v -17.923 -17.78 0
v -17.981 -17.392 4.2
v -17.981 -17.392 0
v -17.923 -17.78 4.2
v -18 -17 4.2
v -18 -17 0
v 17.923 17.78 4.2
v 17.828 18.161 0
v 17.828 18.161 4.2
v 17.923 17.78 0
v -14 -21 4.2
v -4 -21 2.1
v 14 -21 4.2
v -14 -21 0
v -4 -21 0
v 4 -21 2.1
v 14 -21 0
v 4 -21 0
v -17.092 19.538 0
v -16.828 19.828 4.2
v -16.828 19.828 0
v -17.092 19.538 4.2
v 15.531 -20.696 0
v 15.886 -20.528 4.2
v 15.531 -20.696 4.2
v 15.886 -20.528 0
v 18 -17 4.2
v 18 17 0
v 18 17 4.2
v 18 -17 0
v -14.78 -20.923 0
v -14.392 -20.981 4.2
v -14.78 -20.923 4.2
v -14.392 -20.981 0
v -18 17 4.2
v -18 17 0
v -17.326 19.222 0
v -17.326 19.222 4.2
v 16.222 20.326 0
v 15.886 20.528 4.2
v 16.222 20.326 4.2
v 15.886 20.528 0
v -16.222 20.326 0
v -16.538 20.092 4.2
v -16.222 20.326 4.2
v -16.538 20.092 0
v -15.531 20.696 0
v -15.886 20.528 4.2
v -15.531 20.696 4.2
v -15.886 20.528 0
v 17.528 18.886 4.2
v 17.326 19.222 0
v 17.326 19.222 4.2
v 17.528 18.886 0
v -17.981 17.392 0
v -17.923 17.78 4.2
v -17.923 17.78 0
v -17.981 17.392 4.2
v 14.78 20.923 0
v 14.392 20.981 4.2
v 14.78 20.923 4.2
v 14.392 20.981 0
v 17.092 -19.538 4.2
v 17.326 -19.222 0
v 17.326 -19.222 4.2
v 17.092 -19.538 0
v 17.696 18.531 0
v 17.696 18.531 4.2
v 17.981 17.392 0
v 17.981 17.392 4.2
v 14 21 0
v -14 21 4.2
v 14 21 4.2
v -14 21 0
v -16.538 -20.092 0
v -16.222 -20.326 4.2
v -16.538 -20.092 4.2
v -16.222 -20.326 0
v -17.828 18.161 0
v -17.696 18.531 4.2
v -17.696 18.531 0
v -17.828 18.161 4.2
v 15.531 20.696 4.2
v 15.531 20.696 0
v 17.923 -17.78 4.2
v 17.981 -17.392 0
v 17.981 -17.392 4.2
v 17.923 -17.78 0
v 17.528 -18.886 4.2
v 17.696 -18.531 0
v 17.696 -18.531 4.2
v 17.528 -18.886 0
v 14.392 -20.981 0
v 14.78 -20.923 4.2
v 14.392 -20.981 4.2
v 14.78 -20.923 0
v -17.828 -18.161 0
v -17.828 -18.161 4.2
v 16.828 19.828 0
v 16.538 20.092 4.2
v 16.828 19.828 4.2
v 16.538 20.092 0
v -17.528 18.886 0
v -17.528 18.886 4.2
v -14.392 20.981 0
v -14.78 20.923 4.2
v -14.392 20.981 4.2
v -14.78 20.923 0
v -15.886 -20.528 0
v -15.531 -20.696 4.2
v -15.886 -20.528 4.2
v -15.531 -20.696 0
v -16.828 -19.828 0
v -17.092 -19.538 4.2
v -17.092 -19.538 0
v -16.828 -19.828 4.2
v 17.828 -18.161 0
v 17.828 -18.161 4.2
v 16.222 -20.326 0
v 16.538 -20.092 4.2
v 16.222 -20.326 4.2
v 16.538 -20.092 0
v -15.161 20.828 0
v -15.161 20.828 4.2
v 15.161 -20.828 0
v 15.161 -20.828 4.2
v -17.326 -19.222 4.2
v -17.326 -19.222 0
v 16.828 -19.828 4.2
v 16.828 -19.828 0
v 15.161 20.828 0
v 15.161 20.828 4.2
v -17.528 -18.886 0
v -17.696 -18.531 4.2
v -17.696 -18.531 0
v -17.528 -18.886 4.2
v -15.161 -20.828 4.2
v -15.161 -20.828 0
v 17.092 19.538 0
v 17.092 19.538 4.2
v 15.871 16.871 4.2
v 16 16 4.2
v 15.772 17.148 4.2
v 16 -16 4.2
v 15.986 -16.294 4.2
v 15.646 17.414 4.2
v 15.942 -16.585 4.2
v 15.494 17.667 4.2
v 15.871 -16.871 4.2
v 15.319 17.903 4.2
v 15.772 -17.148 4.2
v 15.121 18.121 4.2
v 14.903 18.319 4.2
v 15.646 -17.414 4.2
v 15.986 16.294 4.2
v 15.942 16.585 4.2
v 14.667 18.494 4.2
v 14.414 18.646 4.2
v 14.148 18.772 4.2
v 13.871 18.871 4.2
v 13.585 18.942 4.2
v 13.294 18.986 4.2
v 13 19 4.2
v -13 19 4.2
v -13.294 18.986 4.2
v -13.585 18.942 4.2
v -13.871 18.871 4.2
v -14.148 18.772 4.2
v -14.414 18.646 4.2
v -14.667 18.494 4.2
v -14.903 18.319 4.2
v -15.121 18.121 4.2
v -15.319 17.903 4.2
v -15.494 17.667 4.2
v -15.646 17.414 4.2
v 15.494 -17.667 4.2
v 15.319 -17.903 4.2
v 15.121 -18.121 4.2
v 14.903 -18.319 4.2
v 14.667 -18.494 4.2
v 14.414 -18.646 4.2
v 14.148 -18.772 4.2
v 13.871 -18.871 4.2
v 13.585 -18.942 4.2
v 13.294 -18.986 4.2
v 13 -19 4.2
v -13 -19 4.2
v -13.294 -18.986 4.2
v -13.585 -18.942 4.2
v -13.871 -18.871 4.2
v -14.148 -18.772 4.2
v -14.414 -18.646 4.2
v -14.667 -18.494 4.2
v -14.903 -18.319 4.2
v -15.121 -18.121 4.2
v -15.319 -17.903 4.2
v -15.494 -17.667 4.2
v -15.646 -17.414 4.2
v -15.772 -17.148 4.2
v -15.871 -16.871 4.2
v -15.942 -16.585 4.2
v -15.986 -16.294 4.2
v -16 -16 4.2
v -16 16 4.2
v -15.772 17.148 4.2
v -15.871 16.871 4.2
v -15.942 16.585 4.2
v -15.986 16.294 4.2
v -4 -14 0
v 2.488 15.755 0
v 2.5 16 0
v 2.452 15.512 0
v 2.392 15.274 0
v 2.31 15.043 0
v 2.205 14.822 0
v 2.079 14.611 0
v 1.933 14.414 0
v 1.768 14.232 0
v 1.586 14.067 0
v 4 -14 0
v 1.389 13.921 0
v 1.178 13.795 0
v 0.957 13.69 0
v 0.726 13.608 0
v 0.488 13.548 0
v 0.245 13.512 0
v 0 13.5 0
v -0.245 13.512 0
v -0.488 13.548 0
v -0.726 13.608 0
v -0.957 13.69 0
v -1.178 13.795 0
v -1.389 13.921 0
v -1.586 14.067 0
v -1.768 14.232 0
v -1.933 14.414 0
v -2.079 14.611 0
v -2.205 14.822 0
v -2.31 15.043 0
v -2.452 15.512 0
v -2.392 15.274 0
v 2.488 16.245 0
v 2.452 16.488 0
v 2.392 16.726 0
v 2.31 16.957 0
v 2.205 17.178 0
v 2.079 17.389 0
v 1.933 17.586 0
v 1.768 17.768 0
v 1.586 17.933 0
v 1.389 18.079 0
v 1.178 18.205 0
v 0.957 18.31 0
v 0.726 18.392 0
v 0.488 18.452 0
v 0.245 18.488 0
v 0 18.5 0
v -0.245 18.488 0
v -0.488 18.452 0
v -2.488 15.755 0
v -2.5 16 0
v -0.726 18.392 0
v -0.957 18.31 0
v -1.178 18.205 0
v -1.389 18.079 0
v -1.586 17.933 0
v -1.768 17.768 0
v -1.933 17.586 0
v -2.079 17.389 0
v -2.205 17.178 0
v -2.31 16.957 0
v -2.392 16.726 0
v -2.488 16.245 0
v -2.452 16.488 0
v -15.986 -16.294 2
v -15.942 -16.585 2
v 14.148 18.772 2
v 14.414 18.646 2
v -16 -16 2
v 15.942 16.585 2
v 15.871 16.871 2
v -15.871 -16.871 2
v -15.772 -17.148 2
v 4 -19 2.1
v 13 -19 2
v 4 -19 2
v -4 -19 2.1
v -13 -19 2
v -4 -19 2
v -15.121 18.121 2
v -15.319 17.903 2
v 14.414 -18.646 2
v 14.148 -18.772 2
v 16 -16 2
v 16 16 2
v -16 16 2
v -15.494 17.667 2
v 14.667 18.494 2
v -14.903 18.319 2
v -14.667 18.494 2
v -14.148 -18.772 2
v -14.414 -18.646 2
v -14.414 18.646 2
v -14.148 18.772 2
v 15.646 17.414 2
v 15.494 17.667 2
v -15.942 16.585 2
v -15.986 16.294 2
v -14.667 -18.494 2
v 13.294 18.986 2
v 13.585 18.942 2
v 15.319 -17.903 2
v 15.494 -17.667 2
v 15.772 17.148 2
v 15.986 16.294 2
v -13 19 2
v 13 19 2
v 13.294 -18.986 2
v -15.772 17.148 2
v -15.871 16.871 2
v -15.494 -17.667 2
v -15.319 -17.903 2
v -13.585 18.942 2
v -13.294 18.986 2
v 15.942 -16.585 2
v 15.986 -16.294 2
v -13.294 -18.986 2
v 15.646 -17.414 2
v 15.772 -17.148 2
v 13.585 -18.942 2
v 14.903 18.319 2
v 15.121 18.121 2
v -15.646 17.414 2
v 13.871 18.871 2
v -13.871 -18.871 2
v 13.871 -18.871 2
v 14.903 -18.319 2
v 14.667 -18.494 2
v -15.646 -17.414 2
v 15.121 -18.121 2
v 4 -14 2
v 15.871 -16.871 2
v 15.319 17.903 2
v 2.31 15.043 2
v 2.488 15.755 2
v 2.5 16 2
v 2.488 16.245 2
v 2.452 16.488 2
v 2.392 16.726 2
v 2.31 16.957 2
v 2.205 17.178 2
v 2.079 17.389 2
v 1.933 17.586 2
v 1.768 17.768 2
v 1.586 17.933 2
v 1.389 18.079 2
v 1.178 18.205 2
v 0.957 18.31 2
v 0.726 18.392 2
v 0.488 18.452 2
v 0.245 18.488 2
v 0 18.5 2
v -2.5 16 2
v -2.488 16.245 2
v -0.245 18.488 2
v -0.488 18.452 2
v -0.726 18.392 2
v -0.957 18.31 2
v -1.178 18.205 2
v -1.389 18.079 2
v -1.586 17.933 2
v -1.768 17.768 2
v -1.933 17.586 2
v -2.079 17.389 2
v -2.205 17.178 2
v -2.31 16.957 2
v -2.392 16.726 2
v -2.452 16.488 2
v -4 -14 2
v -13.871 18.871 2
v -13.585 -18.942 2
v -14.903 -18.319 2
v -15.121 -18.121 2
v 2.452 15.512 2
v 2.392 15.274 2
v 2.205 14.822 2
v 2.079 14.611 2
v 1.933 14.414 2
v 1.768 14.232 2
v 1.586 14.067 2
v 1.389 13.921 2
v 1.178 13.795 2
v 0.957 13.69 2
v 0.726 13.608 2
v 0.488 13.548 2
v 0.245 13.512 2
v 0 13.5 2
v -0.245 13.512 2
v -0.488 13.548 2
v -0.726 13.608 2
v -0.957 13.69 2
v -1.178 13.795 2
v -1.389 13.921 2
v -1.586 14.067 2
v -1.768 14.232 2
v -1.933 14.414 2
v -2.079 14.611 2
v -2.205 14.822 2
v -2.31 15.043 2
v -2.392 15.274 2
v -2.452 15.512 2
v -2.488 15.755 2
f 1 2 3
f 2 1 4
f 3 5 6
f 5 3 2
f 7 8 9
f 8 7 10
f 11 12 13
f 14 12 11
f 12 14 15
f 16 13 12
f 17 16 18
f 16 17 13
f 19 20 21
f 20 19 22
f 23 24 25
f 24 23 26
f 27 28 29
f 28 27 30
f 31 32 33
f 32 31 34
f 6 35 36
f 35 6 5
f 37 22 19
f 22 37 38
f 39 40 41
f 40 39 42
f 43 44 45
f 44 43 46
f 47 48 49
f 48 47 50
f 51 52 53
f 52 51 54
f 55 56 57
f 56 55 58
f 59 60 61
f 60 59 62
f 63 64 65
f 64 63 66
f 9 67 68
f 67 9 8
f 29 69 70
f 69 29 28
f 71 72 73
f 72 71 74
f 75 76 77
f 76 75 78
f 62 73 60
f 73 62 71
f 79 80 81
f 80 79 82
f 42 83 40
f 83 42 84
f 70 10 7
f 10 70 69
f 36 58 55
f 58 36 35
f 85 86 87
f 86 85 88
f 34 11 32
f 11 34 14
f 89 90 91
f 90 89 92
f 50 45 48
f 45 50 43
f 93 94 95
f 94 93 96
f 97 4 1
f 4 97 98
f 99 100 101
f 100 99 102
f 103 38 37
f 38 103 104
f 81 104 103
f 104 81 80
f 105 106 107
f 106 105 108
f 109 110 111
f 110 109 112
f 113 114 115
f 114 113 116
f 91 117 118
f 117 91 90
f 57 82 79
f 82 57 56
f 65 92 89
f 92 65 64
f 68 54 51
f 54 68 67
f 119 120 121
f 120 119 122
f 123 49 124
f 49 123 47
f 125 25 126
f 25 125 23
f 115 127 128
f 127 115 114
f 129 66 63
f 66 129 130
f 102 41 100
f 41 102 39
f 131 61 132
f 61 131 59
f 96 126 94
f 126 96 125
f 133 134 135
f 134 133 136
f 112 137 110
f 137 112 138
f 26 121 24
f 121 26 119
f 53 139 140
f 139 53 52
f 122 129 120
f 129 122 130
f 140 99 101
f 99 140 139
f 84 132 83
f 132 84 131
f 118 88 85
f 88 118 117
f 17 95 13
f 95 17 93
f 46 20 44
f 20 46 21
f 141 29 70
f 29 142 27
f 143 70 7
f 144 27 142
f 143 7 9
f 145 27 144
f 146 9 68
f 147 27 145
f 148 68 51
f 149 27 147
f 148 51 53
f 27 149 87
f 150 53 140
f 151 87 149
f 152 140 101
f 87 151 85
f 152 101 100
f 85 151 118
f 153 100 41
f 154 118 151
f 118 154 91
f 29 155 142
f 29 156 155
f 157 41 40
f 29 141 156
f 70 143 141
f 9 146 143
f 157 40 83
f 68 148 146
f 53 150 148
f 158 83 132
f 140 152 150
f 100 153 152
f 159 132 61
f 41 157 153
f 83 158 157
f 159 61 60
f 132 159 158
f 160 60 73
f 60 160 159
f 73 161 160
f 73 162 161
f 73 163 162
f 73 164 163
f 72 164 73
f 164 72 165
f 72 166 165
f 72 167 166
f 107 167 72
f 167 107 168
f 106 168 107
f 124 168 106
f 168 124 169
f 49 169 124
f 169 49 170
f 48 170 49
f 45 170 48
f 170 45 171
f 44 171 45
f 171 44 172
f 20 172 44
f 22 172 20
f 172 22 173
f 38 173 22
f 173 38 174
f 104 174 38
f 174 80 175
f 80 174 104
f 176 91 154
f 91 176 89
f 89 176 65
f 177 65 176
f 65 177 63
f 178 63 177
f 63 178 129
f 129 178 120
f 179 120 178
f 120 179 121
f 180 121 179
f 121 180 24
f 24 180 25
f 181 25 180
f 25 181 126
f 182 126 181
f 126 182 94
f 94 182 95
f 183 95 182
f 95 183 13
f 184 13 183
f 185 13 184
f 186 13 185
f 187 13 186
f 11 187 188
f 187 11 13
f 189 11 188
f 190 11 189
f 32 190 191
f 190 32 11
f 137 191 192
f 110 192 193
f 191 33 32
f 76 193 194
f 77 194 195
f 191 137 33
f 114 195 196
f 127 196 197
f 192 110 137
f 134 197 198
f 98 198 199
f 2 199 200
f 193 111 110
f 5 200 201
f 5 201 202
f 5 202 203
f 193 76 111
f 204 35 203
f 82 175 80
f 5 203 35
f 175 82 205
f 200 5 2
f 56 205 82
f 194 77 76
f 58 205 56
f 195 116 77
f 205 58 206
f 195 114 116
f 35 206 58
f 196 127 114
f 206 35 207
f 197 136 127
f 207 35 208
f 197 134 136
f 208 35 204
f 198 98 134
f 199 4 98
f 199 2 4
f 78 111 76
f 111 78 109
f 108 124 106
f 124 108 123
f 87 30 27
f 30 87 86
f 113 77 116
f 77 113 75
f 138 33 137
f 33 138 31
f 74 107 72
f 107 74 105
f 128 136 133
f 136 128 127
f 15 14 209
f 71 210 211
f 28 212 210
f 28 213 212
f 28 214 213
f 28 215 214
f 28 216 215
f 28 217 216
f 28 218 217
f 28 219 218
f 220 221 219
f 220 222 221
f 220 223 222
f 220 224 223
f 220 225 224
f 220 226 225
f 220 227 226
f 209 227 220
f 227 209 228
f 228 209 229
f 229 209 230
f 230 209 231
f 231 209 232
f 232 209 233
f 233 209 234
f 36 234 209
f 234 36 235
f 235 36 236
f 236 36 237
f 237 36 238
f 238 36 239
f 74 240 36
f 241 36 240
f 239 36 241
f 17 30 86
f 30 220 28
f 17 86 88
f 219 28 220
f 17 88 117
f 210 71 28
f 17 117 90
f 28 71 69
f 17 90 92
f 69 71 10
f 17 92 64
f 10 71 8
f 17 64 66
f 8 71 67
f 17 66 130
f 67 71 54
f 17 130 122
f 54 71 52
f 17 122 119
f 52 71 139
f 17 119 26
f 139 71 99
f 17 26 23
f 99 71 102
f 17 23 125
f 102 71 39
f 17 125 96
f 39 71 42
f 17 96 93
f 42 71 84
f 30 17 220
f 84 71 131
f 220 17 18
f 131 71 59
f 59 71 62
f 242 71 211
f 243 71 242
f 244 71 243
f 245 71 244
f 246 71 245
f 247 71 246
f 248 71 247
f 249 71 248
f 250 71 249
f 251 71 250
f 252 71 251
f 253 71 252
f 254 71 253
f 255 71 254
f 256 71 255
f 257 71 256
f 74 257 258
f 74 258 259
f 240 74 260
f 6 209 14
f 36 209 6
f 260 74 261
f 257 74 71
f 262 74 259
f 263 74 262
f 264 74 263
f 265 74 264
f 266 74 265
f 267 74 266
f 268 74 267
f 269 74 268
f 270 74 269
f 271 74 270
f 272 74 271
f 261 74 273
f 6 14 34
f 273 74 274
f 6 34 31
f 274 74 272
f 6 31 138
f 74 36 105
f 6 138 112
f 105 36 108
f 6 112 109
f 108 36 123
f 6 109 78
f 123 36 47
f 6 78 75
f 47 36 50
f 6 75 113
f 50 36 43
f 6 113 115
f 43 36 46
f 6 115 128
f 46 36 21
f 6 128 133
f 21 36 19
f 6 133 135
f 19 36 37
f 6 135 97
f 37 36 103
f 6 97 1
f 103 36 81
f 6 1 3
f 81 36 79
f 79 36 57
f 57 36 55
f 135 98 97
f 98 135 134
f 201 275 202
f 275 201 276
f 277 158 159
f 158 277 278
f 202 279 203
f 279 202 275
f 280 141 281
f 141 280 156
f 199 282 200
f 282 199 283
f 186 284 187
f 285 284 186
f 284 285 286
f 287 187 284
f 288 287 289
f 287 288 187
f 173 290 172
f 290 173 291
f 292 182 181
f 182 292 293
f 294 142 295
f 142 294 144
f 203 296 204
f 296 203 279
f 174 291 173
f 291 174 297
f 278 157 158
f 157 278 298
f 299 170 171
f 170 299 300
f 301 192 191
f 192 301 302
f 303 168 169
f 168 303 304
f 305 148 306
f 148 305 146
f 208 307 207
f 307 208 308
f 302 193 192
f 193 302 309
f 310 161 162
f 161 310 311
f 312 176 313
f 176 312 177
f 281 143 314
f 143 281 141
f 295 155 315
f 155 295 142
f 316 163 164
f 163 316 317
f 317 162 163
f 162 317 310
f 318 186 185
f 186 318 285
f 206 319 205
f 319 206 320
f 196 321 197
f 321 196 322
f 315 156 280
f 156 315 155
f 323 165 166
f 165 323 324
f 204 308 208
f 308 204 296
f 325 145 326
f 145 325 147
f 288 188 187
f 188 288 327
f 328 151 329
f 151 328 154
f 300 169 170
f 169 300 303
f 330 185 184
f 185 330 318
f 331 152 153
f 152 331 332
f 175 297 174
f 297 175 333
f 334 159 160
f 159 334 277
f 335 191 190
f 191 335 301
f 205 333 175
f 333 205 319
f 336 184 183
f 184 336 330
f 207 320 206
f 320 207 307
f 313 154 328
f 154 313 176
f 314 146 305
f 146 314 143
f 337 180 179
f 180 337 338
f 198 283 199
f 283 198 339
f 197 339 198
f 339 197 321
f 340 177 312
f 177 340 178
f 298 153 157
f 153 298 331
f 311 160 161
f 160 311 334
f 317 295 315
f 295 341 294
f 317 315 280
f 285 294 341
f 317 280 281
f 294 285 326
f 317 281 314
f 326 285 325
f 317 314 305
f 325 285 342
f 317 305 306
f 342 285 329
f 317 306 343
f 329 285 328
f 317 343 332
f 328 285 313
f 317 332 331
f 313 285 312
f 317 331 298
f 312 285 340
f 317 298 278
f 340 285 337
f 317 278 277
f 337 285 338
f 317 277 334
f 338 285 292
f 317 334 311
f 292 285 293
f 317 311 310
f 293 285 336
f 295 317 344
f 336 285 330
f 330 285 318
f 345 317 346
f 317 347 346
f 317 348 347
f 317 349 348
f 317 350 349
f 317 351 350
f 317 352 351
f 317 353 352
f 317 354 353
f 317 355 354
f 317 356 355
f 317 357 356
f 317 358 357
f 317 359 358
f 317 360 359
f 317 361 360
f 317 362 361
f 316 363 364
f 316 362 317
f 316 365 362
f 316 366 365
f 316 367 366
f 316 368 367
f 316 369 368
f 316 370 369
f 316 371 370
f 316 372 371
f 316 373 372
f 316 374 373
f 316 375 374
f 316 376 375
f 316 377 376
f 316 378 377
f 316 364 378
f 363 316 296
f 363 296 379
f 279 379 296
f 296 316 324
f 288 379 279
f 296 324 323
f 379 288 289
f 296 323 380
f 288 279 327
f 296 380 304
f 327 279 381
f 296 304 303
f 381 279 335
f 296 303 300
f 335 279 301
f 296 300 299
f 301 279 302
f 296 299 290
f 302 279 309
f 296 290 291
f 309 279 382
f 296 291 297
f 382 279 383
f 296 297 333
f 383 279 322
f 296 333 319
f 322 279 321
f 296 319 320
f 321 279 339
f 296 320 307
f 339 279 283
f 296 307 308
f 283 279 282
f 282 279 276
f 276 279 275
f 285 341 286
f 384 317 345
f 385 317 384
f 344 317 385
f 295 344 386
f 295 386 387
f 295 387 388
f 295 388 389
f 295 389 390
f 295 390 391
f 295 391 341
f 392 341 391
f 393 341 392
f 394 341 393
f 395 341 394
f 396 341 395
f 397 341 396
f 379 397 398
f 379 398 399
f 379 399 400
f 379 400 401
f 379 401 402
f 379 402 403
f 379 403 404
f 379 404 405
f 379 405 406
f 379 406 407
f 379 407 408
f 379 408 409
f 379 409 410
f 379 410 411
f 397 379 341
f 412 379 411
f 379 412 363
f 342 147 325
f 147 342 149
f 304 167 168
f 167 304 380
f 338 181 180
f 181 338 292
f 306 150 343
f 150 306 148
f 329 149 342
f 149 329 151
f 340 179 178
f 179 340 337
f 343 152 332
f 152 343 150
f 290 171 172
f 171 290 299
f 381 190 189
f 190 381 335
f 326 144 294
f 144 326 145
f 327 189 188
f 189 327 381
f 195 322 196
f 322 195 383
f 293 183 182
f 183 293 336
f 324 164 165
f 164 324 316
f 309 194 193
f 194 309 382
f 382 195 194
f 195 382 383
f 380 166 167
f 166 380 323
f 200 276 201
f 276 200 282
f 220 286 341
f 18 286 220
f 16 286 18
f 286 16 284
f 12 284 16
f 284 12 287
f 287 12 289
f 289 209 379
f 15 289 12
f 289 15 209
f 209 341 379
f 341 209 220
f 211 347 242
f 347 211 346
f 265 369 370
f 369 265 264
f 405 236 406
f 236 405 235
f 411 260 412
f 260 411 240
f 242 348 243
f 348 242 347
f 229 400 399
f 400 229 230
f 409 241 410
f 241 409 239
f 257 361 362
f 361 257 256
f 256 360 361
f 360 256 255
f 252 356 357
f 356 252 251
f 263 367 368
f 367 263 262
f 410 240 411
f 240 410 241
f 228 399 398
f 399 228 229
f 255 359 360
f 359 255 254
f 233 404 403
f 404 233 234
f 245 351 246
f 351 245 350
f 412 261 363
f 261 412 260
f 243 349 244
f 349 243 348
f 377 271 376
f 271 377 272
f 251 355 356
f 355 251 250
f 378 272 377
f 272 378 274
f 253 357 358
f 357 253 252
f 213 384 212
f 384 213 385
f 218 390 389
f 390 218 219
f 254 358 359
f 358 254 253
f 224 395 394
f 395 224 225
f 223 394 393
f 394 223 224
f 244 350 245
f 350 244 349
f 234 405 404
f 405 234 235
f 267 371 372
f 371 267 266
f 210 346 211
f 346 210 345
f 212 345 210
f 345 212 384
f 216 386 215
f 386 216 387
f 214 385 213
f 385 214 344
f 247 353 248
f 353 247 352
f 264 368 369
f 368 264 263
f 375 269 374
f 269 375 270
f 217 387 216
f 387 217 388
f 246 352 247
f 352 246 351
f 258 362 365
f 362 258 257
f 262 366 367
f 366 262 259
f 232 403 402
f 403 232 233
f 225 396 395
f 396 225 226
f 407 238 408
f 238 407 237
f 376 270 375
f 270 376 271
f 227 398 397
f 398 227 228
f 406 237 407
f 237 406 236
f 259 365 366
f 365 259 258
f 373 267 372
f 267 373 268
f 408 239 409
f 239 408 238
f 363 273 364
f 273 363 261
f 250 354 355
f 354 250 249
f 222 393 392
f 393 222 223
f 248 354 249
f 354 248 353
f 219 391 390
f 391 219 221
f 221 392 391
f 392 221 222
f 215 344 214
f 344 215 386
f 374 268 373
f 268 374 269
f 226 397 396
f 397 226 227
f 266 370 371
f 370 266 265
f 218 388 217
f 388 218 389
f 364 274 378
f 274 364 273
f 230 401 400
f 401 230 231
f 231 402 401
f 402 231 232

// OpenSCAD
// TS-PET-005 - Collar Tag Silencer Sleeve
$fn = 64;
tag_w = 32;
tag_h = 38;
overall_t = 4.2;
wall = 2.0;
slot_gap = 8;
ring_hole_d = 5.0;
corner_d = 8;
module rounded_rect_2d(w, h, d) {
    hull() {
        translate([-w/2 + d/2, -h/2 + d/2]) circle(d = d);
        translate([ w/2 - d/2, -h/2 + d/2]) circle(d = d);
        translate([-w/2 + d/2,  h/2 - d/2]) circle(d = d);
        translate([ w/2 - d/2,  h/2 - d/2]) circle(d = d);
    }
}
difference() {
    linear_extrude(height = overall_t) rounded_rect_2d(tag_w + 2*wall, tag_h + 2*wall, corner_d);
    translate([0,0,wall]) linear_extrude(height = overall_t) rounded_rect_2d(tag_w, tag_h, max(4, corner_d - 2));
    translate([0, -(tag_h/2 + wall), -1]) cube([slot_gap, 14, overall_t + 2], center = true);
    translate([0, tag_h/2 + wall - 5, -1]) cylinder(h = overall_t + 2, d = ring_hole_d);
}
